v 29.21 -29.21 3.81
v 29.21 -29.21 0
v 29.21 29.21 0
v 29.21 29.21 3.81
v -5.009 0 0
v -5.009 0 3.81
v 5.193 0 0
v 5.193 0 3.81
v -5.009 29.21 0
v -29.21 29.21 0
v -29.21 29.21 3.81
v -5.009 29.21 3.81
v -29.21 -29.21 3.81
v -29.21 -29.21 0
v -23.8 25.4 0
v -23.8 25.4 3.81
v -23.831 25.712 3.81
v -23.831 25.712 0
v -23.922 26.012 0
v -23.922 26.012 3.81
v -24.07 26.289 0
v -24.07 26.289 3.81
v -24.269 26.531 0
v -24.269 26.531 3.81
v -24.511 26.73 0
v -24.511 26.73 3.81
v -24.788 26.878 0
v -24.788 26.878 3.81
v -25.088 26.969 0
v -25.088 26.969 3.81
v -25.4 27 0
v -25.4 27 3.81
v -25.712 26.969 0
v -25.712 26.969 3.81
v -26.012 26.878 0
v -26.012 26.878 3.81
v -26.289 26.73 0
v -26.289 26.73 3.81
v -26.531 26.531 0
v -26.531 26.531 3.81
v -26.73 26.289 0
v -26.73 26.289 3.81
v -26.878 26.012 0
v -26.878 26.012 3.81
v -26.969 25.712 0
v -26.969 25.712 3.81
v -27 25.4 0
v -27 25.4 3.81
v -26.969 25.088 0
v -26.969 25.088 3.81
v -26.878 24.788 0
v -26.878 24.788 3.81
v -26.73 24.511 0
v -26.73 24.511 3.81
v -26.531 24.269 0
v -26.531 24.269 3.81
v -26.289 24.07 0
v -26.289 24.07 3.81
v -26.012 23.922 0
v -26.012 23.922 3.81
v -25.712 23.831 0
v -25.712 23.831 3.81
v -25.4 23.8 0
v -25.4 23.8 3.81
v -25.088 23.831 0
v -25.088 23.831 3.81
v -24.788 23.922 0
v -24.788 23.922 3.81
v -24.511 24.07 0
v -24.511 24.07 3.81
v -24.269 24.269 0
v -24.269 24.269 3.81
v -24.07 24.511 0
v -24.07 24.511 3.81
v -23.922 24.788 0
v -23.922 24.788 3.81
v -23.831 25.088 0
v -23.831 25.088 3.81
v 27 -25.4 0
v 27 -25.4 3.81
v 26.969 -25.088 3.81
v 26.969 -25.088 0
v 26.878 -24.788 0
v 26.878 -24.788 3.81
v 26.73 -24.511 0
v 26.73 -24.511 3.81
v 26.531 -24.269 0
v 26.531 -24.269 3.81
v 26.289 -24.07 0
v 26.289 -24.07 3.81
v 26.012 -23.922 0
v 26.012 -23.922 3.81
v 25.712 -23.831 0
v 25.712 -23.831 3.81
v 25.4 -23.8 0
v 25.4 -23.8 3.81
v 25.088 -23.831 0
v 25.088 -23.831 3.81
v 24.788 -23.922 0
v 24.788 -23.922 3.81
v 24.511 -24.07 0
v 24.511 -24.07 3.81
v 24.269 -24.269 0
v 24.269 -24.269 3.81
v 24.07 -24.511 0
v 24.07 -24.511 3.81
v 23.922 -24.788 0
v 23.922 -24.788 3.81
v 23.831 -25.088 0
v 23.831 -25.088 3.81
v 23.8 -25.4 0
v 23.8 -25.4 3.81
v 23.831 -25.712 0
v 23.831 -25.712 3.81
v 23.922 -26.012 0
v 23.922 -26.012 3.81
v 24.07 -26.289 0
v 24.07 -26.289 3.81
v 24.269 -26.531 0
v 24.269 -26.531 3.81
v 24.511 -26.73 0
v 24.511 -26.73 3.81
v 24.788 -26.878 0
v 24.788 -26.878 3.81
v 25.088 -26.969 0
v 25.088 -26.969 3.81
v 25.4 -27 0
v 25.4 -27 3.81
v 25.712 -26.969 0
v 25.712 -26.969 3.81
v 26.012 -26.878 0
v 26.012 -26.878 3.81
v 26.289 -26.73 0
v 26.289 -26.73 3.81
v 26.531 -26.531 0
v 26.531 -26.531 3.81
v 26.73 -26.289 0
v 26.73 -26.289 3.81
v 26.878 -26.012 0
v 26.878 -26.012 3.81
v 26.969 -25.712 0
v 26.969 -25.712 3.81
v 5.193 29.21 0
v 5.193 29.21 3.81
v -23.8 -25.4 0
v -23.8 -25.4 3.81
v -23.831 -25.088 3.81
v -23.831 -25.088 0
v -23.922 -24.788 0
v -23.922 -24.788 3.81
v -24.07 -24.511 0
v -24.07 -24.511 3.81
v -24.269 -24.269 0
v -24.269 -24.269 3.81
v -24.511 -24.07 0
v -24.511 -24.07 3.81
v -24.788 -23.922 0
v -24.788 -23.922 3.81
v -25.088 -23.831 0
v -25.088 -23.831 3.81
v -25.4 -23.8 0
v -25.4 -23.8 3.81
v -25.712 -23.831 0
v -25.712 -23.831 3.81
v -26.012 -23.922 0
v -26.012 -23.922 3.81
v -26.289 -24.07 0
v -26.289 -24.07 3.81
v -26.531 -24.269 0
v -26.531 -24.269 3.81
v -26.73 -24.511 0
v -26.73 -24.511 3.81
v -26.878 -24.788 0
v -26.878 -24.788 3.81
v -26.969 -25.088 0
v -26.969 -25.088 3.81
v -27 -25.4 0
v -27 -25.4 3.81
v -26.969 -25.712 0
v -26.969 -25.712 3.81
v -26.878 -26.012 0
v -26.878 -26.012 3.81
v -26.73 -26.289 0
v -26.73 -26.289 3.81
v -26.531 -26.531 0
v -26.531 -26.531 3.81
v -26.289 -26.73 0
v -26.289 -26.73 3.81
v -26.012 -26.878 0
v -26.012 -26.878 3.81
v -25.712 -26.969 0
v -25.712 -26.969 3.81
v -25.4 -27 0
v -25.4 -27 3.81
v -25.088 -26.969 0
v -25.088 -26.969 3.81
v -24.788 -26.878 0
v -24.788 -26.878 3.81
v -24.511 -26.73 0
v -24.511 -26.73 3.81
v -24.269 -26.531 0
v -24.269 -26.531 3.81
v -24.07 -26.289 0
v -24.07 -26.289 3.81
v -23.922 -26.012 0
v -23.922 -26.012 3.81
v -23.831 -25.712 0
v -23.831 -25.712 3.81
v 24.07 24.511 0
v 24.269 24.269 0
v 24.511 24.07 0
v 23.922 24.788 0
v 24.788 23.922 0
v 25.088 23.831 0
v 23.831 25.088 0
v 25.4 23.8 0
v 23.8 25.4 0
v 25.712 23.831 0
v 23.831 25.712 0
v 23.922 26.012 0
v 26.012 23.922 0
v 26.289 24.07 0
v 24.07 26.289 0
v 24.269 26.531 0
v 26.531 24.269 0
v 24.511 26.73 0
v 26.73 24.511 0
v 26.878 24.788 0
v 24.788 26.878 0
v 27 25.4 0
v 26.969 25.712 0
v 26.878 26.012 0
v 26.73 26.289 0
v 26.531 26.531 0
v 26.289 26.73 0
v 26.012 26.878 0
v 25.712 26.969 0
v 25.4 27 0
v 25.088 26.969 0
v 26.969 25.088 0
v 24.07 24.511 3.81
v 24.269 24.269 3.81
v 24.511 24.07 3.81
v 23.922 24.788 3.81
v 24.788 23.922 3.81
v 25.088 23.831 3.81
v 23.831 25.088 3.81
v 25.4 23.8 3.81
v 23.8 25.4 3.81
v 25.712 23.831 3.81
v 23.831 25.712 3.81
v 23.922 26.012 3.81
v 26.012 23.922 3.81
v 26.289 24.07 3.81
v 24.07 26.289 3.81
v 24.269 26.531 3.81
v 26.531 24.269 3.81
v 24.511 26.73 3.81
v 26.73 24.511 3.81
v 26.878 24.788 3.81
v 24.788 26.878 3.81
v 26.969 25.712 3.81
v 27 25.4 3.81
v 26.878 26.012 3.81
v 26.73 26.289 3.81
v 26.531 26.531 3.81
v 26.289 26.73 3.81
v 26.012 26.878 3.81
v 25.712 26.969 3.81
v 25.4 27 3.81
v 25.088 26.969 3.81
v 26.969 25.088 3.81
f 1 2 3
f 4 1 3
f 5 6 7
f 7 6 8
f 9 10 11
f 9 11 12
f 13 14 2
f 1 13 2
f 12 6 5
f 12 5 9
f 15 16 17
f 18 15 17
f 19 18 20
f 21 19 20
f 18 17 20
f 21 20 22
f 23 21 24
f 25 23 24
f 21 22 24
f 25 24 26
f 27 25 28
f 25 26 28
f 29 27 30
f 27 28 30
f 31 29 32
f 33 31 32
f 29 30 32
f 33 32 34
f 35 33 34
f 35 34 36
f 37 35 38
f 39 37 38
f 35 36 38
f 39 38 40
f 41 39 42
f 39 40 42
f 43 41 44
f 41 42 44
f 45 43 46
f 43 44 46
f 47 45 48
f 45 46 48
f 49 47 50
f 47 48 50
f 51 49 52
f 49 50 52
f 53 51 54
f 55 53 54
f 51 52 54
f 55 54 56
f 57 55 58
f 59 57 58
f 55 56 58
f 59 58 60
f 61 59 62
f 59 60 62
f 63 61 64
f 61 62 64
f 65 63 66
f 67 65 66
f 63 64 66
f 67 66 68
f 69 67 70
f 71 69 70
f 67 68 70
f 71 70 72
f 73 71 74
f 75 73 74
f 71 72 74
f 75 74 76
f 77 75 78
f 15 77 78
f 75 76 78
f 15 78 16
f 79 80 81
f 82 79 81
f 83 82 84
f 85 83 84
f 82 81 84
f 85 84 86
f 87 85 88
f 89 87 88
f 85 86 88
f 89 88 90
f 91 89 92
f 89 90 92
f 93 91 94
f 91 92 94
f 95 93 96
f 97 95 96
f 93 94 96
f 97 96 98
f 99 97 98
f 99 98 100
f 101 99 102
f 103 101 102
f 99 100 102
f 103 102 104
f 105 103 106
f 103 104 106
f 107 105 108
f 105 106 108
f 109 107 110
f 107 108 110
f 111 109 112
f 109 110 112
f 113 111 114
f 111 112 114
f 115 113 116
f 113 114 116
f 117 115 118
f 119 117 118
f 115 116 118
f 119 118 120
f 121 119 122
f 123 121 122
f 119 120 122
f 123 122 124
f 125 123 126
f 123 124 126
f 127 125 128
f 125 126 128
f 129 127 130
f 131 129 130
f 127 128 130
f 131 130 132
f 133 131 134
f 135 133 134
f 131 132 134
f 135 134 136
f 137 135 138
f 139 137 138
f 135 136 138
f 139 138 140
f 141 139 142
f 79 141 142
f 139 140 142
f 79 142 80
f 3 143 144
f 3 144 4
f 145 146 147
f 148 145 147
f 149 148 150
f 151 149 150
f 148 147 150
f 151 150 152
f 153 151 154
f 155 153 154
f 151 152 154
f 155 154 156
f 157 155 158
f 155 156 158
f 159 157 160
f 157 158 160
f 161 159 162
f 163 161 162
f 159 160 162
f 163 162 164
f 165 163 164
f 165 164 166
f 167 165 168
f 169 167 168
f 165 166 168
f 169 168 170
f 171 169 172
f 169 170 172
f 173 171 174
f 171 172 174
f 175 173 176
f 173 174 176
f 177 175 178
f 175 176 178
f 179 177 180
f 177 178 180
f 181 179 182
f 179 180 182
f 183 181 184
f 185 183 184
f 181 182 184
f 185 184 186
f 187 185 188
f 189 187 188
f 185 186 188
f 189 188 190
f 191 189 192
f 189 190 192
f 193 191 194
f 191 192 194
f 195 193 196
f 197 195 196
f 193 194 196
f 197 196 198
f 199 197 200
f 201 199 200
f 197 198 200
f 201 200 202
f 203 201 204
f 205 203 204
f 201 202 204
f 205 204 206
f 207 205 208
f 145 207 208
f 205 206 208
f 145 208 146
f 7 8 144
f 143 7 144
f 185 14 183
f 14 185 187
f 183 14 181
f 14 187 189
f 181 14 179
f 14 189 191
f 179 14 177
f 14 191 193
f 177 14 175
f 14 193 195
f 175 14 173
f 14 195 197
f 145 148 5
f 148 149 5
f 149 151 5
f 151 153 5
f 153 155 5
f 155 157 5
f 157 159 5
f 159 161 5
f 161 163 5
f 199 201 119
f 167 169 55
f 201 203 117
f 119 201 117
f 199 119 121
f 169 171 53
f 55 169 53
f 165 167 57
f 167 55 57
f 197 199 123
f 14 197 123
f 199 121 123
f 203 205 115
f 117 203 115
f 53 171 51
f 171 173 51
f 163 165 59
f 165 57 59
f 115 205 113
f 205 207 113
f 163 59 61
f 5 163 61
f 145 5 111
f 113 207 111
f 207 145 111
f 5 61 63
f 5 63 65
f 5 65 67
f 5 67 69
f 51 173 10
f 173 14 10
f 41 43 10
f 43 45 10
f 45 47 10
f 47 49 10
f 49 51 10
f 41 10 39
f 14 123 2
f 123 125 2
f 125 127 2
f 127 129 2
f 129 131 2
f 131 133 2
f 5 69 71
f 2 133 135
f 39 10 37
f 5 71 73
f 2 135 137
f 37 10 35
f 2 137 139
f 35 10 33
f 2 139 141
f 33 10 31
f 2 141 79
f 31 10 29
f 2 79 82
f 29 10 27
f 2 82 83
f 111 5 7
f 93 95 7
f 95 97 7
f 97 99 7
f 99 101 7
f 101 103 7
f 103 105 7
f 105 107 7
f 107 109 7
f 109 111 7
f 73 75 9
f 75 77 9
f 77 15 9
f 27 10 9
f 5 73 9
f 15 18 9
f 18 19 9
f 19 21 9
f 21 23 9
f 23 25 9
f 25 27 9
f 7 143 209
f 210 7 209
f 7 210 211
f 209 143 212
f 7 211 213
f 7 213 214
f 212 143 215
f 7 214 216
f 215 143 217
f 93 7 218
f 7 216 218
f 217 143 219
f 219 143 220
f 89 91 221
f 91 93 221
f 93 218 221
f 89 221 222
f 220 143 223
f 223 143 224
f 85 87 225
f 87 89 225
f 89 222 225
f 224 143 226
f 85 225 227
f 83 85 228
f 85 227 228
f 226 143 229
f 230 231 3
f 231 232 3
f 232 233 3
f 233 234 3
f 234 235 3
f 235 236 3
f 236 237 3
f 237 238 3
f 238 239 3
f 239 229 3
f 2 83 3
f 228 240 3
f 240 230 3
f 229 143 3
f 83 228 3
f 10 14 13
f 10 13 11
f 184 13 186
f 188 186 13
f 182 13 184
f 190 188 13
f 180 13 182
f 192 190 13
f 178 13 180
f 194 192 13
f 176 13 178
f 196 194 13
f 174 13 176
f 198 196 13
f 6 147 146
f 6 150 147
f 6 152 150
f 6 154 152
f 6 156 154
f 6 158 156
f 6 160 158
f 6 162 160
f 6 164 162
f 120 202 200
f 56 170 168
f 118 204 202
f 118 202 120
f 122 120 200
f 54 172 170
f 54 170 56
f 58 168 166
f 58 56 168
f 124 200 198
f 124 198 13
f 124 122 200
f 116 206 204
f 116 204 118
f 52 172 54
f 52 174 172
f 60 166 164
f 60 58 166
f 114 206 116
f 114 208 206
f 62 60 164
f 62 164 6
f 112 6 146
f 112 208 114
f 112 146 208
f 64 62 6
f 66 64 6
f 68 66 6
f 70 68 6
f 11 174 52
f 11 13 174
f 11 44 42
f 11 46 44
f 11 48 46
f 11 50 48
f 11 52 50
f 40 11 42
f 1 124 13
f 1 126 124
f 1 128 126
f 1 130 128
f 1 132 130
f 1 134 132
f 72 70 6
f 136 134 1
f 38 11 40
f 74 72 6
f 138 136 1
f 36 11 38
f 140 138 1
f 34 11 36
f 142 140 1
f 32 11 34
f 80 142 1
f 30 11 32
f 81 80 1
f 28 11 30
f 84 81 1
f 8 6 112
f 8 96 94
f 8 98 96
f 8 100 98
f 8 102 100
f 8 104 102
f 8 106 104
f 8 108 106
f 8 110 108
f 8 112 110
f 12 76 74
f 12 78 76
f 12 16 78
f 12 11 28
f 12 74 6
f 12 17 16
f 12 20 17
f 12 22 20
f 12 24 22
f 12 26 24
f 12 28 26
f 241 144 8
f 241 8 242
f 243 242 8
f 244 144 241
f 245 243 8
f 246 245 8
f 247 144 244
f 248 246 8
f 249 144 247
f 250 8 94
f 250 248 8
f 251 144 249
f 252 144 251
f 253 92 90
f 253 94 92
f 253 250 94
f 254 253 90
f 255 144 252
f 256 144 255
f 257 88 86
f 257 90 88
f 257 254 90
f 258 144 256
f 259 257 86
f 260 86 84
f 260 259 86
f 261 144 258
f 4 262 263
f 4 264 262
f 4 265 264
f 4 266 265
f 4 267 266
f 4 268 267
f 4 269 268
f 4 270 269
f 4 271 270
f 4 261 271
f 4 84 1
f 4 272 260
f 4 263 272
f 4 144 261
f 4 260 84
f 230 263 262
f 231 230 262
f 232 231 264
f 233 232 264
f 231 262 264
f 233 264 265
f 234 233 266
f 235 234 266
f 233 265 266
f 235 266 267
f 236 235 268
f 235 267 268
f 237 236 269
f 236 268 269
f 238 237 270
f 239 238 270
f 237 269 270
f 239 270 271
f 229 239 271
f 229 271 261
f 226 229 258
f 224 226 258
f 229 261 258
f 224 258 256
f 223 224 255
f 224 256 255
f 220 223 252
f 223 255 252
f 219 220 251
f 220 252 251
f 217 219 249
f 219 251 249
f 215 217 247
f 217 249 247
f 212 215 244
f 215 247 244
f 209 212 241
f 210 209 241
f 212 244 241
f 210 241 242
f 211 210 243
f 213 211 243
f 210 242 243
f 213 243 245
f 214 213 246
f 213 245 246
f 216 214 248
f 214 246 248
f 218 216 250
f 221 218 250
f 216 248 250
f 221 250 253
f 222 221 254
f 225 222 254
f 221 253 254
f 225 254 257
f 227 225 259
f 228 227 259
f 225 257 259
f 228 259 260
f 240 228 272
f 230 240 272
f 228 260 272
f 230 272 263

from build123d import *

# Parameters (mm, degrees)
SKETCH1_W           = 58.42
SKETCH1_H           = 58.42
BOSS_EXTRUDE1_DEPTH = 3.81
SKETCH2_R           = 1.5999968
SKETCH2_R_2         = 1.6
CUT_EXTRUDE1_DEPTH  = 3.81
SKETCH5_W           = 10.202183674
SKETCH5_H           = 29.21
CUT_EXTRUDE3_DEPTH  = 3.81


with BuildPart() as part:
    # Sketch1 → Boss-Extrude1 (new body)
    with BuildSketch(Plane.XY):
        Rectangle(SKETCH1_W, SKETCH1_H)
    extrude(amount=BOSS_EXTRUDE1_DEPTH)

    # Sketch2 → Cut-Extrude1 (cut)
    with BuildSketch(Plane.XY.offset(3.81)):
        with Locations((-25.400000617, 25.400000617)):
            Circle(SKETCH2_R)
        with Locations((25.400000617, 25.400000617)):
            Circle(SKETCH2_R_2)
        with Locations((-25.400000617, -25.400000617)):
            Circle(SKETCH2_R_2)
        with Locations((25.400000617, -25.400000617)):
            Circle(SKETCH2_R_2)
    extrude(amount=-CUT_EXTRUDE1_DEPTH, mode=Mode.SUBTRACT)

    # Sketch5 → Cut-Extrude3 (cut)
    with BuildSketch(Plane.XY.offset(3.81)):
        with Locations((0.091911565, 14.605)):
            Rectangle(SKETCH5_W, SKETCH5_H)
    extrude(amount=-CUT_EXTRUDE3_DEPTH, mode=Mode.SUBTRACT)


solid = part.part
